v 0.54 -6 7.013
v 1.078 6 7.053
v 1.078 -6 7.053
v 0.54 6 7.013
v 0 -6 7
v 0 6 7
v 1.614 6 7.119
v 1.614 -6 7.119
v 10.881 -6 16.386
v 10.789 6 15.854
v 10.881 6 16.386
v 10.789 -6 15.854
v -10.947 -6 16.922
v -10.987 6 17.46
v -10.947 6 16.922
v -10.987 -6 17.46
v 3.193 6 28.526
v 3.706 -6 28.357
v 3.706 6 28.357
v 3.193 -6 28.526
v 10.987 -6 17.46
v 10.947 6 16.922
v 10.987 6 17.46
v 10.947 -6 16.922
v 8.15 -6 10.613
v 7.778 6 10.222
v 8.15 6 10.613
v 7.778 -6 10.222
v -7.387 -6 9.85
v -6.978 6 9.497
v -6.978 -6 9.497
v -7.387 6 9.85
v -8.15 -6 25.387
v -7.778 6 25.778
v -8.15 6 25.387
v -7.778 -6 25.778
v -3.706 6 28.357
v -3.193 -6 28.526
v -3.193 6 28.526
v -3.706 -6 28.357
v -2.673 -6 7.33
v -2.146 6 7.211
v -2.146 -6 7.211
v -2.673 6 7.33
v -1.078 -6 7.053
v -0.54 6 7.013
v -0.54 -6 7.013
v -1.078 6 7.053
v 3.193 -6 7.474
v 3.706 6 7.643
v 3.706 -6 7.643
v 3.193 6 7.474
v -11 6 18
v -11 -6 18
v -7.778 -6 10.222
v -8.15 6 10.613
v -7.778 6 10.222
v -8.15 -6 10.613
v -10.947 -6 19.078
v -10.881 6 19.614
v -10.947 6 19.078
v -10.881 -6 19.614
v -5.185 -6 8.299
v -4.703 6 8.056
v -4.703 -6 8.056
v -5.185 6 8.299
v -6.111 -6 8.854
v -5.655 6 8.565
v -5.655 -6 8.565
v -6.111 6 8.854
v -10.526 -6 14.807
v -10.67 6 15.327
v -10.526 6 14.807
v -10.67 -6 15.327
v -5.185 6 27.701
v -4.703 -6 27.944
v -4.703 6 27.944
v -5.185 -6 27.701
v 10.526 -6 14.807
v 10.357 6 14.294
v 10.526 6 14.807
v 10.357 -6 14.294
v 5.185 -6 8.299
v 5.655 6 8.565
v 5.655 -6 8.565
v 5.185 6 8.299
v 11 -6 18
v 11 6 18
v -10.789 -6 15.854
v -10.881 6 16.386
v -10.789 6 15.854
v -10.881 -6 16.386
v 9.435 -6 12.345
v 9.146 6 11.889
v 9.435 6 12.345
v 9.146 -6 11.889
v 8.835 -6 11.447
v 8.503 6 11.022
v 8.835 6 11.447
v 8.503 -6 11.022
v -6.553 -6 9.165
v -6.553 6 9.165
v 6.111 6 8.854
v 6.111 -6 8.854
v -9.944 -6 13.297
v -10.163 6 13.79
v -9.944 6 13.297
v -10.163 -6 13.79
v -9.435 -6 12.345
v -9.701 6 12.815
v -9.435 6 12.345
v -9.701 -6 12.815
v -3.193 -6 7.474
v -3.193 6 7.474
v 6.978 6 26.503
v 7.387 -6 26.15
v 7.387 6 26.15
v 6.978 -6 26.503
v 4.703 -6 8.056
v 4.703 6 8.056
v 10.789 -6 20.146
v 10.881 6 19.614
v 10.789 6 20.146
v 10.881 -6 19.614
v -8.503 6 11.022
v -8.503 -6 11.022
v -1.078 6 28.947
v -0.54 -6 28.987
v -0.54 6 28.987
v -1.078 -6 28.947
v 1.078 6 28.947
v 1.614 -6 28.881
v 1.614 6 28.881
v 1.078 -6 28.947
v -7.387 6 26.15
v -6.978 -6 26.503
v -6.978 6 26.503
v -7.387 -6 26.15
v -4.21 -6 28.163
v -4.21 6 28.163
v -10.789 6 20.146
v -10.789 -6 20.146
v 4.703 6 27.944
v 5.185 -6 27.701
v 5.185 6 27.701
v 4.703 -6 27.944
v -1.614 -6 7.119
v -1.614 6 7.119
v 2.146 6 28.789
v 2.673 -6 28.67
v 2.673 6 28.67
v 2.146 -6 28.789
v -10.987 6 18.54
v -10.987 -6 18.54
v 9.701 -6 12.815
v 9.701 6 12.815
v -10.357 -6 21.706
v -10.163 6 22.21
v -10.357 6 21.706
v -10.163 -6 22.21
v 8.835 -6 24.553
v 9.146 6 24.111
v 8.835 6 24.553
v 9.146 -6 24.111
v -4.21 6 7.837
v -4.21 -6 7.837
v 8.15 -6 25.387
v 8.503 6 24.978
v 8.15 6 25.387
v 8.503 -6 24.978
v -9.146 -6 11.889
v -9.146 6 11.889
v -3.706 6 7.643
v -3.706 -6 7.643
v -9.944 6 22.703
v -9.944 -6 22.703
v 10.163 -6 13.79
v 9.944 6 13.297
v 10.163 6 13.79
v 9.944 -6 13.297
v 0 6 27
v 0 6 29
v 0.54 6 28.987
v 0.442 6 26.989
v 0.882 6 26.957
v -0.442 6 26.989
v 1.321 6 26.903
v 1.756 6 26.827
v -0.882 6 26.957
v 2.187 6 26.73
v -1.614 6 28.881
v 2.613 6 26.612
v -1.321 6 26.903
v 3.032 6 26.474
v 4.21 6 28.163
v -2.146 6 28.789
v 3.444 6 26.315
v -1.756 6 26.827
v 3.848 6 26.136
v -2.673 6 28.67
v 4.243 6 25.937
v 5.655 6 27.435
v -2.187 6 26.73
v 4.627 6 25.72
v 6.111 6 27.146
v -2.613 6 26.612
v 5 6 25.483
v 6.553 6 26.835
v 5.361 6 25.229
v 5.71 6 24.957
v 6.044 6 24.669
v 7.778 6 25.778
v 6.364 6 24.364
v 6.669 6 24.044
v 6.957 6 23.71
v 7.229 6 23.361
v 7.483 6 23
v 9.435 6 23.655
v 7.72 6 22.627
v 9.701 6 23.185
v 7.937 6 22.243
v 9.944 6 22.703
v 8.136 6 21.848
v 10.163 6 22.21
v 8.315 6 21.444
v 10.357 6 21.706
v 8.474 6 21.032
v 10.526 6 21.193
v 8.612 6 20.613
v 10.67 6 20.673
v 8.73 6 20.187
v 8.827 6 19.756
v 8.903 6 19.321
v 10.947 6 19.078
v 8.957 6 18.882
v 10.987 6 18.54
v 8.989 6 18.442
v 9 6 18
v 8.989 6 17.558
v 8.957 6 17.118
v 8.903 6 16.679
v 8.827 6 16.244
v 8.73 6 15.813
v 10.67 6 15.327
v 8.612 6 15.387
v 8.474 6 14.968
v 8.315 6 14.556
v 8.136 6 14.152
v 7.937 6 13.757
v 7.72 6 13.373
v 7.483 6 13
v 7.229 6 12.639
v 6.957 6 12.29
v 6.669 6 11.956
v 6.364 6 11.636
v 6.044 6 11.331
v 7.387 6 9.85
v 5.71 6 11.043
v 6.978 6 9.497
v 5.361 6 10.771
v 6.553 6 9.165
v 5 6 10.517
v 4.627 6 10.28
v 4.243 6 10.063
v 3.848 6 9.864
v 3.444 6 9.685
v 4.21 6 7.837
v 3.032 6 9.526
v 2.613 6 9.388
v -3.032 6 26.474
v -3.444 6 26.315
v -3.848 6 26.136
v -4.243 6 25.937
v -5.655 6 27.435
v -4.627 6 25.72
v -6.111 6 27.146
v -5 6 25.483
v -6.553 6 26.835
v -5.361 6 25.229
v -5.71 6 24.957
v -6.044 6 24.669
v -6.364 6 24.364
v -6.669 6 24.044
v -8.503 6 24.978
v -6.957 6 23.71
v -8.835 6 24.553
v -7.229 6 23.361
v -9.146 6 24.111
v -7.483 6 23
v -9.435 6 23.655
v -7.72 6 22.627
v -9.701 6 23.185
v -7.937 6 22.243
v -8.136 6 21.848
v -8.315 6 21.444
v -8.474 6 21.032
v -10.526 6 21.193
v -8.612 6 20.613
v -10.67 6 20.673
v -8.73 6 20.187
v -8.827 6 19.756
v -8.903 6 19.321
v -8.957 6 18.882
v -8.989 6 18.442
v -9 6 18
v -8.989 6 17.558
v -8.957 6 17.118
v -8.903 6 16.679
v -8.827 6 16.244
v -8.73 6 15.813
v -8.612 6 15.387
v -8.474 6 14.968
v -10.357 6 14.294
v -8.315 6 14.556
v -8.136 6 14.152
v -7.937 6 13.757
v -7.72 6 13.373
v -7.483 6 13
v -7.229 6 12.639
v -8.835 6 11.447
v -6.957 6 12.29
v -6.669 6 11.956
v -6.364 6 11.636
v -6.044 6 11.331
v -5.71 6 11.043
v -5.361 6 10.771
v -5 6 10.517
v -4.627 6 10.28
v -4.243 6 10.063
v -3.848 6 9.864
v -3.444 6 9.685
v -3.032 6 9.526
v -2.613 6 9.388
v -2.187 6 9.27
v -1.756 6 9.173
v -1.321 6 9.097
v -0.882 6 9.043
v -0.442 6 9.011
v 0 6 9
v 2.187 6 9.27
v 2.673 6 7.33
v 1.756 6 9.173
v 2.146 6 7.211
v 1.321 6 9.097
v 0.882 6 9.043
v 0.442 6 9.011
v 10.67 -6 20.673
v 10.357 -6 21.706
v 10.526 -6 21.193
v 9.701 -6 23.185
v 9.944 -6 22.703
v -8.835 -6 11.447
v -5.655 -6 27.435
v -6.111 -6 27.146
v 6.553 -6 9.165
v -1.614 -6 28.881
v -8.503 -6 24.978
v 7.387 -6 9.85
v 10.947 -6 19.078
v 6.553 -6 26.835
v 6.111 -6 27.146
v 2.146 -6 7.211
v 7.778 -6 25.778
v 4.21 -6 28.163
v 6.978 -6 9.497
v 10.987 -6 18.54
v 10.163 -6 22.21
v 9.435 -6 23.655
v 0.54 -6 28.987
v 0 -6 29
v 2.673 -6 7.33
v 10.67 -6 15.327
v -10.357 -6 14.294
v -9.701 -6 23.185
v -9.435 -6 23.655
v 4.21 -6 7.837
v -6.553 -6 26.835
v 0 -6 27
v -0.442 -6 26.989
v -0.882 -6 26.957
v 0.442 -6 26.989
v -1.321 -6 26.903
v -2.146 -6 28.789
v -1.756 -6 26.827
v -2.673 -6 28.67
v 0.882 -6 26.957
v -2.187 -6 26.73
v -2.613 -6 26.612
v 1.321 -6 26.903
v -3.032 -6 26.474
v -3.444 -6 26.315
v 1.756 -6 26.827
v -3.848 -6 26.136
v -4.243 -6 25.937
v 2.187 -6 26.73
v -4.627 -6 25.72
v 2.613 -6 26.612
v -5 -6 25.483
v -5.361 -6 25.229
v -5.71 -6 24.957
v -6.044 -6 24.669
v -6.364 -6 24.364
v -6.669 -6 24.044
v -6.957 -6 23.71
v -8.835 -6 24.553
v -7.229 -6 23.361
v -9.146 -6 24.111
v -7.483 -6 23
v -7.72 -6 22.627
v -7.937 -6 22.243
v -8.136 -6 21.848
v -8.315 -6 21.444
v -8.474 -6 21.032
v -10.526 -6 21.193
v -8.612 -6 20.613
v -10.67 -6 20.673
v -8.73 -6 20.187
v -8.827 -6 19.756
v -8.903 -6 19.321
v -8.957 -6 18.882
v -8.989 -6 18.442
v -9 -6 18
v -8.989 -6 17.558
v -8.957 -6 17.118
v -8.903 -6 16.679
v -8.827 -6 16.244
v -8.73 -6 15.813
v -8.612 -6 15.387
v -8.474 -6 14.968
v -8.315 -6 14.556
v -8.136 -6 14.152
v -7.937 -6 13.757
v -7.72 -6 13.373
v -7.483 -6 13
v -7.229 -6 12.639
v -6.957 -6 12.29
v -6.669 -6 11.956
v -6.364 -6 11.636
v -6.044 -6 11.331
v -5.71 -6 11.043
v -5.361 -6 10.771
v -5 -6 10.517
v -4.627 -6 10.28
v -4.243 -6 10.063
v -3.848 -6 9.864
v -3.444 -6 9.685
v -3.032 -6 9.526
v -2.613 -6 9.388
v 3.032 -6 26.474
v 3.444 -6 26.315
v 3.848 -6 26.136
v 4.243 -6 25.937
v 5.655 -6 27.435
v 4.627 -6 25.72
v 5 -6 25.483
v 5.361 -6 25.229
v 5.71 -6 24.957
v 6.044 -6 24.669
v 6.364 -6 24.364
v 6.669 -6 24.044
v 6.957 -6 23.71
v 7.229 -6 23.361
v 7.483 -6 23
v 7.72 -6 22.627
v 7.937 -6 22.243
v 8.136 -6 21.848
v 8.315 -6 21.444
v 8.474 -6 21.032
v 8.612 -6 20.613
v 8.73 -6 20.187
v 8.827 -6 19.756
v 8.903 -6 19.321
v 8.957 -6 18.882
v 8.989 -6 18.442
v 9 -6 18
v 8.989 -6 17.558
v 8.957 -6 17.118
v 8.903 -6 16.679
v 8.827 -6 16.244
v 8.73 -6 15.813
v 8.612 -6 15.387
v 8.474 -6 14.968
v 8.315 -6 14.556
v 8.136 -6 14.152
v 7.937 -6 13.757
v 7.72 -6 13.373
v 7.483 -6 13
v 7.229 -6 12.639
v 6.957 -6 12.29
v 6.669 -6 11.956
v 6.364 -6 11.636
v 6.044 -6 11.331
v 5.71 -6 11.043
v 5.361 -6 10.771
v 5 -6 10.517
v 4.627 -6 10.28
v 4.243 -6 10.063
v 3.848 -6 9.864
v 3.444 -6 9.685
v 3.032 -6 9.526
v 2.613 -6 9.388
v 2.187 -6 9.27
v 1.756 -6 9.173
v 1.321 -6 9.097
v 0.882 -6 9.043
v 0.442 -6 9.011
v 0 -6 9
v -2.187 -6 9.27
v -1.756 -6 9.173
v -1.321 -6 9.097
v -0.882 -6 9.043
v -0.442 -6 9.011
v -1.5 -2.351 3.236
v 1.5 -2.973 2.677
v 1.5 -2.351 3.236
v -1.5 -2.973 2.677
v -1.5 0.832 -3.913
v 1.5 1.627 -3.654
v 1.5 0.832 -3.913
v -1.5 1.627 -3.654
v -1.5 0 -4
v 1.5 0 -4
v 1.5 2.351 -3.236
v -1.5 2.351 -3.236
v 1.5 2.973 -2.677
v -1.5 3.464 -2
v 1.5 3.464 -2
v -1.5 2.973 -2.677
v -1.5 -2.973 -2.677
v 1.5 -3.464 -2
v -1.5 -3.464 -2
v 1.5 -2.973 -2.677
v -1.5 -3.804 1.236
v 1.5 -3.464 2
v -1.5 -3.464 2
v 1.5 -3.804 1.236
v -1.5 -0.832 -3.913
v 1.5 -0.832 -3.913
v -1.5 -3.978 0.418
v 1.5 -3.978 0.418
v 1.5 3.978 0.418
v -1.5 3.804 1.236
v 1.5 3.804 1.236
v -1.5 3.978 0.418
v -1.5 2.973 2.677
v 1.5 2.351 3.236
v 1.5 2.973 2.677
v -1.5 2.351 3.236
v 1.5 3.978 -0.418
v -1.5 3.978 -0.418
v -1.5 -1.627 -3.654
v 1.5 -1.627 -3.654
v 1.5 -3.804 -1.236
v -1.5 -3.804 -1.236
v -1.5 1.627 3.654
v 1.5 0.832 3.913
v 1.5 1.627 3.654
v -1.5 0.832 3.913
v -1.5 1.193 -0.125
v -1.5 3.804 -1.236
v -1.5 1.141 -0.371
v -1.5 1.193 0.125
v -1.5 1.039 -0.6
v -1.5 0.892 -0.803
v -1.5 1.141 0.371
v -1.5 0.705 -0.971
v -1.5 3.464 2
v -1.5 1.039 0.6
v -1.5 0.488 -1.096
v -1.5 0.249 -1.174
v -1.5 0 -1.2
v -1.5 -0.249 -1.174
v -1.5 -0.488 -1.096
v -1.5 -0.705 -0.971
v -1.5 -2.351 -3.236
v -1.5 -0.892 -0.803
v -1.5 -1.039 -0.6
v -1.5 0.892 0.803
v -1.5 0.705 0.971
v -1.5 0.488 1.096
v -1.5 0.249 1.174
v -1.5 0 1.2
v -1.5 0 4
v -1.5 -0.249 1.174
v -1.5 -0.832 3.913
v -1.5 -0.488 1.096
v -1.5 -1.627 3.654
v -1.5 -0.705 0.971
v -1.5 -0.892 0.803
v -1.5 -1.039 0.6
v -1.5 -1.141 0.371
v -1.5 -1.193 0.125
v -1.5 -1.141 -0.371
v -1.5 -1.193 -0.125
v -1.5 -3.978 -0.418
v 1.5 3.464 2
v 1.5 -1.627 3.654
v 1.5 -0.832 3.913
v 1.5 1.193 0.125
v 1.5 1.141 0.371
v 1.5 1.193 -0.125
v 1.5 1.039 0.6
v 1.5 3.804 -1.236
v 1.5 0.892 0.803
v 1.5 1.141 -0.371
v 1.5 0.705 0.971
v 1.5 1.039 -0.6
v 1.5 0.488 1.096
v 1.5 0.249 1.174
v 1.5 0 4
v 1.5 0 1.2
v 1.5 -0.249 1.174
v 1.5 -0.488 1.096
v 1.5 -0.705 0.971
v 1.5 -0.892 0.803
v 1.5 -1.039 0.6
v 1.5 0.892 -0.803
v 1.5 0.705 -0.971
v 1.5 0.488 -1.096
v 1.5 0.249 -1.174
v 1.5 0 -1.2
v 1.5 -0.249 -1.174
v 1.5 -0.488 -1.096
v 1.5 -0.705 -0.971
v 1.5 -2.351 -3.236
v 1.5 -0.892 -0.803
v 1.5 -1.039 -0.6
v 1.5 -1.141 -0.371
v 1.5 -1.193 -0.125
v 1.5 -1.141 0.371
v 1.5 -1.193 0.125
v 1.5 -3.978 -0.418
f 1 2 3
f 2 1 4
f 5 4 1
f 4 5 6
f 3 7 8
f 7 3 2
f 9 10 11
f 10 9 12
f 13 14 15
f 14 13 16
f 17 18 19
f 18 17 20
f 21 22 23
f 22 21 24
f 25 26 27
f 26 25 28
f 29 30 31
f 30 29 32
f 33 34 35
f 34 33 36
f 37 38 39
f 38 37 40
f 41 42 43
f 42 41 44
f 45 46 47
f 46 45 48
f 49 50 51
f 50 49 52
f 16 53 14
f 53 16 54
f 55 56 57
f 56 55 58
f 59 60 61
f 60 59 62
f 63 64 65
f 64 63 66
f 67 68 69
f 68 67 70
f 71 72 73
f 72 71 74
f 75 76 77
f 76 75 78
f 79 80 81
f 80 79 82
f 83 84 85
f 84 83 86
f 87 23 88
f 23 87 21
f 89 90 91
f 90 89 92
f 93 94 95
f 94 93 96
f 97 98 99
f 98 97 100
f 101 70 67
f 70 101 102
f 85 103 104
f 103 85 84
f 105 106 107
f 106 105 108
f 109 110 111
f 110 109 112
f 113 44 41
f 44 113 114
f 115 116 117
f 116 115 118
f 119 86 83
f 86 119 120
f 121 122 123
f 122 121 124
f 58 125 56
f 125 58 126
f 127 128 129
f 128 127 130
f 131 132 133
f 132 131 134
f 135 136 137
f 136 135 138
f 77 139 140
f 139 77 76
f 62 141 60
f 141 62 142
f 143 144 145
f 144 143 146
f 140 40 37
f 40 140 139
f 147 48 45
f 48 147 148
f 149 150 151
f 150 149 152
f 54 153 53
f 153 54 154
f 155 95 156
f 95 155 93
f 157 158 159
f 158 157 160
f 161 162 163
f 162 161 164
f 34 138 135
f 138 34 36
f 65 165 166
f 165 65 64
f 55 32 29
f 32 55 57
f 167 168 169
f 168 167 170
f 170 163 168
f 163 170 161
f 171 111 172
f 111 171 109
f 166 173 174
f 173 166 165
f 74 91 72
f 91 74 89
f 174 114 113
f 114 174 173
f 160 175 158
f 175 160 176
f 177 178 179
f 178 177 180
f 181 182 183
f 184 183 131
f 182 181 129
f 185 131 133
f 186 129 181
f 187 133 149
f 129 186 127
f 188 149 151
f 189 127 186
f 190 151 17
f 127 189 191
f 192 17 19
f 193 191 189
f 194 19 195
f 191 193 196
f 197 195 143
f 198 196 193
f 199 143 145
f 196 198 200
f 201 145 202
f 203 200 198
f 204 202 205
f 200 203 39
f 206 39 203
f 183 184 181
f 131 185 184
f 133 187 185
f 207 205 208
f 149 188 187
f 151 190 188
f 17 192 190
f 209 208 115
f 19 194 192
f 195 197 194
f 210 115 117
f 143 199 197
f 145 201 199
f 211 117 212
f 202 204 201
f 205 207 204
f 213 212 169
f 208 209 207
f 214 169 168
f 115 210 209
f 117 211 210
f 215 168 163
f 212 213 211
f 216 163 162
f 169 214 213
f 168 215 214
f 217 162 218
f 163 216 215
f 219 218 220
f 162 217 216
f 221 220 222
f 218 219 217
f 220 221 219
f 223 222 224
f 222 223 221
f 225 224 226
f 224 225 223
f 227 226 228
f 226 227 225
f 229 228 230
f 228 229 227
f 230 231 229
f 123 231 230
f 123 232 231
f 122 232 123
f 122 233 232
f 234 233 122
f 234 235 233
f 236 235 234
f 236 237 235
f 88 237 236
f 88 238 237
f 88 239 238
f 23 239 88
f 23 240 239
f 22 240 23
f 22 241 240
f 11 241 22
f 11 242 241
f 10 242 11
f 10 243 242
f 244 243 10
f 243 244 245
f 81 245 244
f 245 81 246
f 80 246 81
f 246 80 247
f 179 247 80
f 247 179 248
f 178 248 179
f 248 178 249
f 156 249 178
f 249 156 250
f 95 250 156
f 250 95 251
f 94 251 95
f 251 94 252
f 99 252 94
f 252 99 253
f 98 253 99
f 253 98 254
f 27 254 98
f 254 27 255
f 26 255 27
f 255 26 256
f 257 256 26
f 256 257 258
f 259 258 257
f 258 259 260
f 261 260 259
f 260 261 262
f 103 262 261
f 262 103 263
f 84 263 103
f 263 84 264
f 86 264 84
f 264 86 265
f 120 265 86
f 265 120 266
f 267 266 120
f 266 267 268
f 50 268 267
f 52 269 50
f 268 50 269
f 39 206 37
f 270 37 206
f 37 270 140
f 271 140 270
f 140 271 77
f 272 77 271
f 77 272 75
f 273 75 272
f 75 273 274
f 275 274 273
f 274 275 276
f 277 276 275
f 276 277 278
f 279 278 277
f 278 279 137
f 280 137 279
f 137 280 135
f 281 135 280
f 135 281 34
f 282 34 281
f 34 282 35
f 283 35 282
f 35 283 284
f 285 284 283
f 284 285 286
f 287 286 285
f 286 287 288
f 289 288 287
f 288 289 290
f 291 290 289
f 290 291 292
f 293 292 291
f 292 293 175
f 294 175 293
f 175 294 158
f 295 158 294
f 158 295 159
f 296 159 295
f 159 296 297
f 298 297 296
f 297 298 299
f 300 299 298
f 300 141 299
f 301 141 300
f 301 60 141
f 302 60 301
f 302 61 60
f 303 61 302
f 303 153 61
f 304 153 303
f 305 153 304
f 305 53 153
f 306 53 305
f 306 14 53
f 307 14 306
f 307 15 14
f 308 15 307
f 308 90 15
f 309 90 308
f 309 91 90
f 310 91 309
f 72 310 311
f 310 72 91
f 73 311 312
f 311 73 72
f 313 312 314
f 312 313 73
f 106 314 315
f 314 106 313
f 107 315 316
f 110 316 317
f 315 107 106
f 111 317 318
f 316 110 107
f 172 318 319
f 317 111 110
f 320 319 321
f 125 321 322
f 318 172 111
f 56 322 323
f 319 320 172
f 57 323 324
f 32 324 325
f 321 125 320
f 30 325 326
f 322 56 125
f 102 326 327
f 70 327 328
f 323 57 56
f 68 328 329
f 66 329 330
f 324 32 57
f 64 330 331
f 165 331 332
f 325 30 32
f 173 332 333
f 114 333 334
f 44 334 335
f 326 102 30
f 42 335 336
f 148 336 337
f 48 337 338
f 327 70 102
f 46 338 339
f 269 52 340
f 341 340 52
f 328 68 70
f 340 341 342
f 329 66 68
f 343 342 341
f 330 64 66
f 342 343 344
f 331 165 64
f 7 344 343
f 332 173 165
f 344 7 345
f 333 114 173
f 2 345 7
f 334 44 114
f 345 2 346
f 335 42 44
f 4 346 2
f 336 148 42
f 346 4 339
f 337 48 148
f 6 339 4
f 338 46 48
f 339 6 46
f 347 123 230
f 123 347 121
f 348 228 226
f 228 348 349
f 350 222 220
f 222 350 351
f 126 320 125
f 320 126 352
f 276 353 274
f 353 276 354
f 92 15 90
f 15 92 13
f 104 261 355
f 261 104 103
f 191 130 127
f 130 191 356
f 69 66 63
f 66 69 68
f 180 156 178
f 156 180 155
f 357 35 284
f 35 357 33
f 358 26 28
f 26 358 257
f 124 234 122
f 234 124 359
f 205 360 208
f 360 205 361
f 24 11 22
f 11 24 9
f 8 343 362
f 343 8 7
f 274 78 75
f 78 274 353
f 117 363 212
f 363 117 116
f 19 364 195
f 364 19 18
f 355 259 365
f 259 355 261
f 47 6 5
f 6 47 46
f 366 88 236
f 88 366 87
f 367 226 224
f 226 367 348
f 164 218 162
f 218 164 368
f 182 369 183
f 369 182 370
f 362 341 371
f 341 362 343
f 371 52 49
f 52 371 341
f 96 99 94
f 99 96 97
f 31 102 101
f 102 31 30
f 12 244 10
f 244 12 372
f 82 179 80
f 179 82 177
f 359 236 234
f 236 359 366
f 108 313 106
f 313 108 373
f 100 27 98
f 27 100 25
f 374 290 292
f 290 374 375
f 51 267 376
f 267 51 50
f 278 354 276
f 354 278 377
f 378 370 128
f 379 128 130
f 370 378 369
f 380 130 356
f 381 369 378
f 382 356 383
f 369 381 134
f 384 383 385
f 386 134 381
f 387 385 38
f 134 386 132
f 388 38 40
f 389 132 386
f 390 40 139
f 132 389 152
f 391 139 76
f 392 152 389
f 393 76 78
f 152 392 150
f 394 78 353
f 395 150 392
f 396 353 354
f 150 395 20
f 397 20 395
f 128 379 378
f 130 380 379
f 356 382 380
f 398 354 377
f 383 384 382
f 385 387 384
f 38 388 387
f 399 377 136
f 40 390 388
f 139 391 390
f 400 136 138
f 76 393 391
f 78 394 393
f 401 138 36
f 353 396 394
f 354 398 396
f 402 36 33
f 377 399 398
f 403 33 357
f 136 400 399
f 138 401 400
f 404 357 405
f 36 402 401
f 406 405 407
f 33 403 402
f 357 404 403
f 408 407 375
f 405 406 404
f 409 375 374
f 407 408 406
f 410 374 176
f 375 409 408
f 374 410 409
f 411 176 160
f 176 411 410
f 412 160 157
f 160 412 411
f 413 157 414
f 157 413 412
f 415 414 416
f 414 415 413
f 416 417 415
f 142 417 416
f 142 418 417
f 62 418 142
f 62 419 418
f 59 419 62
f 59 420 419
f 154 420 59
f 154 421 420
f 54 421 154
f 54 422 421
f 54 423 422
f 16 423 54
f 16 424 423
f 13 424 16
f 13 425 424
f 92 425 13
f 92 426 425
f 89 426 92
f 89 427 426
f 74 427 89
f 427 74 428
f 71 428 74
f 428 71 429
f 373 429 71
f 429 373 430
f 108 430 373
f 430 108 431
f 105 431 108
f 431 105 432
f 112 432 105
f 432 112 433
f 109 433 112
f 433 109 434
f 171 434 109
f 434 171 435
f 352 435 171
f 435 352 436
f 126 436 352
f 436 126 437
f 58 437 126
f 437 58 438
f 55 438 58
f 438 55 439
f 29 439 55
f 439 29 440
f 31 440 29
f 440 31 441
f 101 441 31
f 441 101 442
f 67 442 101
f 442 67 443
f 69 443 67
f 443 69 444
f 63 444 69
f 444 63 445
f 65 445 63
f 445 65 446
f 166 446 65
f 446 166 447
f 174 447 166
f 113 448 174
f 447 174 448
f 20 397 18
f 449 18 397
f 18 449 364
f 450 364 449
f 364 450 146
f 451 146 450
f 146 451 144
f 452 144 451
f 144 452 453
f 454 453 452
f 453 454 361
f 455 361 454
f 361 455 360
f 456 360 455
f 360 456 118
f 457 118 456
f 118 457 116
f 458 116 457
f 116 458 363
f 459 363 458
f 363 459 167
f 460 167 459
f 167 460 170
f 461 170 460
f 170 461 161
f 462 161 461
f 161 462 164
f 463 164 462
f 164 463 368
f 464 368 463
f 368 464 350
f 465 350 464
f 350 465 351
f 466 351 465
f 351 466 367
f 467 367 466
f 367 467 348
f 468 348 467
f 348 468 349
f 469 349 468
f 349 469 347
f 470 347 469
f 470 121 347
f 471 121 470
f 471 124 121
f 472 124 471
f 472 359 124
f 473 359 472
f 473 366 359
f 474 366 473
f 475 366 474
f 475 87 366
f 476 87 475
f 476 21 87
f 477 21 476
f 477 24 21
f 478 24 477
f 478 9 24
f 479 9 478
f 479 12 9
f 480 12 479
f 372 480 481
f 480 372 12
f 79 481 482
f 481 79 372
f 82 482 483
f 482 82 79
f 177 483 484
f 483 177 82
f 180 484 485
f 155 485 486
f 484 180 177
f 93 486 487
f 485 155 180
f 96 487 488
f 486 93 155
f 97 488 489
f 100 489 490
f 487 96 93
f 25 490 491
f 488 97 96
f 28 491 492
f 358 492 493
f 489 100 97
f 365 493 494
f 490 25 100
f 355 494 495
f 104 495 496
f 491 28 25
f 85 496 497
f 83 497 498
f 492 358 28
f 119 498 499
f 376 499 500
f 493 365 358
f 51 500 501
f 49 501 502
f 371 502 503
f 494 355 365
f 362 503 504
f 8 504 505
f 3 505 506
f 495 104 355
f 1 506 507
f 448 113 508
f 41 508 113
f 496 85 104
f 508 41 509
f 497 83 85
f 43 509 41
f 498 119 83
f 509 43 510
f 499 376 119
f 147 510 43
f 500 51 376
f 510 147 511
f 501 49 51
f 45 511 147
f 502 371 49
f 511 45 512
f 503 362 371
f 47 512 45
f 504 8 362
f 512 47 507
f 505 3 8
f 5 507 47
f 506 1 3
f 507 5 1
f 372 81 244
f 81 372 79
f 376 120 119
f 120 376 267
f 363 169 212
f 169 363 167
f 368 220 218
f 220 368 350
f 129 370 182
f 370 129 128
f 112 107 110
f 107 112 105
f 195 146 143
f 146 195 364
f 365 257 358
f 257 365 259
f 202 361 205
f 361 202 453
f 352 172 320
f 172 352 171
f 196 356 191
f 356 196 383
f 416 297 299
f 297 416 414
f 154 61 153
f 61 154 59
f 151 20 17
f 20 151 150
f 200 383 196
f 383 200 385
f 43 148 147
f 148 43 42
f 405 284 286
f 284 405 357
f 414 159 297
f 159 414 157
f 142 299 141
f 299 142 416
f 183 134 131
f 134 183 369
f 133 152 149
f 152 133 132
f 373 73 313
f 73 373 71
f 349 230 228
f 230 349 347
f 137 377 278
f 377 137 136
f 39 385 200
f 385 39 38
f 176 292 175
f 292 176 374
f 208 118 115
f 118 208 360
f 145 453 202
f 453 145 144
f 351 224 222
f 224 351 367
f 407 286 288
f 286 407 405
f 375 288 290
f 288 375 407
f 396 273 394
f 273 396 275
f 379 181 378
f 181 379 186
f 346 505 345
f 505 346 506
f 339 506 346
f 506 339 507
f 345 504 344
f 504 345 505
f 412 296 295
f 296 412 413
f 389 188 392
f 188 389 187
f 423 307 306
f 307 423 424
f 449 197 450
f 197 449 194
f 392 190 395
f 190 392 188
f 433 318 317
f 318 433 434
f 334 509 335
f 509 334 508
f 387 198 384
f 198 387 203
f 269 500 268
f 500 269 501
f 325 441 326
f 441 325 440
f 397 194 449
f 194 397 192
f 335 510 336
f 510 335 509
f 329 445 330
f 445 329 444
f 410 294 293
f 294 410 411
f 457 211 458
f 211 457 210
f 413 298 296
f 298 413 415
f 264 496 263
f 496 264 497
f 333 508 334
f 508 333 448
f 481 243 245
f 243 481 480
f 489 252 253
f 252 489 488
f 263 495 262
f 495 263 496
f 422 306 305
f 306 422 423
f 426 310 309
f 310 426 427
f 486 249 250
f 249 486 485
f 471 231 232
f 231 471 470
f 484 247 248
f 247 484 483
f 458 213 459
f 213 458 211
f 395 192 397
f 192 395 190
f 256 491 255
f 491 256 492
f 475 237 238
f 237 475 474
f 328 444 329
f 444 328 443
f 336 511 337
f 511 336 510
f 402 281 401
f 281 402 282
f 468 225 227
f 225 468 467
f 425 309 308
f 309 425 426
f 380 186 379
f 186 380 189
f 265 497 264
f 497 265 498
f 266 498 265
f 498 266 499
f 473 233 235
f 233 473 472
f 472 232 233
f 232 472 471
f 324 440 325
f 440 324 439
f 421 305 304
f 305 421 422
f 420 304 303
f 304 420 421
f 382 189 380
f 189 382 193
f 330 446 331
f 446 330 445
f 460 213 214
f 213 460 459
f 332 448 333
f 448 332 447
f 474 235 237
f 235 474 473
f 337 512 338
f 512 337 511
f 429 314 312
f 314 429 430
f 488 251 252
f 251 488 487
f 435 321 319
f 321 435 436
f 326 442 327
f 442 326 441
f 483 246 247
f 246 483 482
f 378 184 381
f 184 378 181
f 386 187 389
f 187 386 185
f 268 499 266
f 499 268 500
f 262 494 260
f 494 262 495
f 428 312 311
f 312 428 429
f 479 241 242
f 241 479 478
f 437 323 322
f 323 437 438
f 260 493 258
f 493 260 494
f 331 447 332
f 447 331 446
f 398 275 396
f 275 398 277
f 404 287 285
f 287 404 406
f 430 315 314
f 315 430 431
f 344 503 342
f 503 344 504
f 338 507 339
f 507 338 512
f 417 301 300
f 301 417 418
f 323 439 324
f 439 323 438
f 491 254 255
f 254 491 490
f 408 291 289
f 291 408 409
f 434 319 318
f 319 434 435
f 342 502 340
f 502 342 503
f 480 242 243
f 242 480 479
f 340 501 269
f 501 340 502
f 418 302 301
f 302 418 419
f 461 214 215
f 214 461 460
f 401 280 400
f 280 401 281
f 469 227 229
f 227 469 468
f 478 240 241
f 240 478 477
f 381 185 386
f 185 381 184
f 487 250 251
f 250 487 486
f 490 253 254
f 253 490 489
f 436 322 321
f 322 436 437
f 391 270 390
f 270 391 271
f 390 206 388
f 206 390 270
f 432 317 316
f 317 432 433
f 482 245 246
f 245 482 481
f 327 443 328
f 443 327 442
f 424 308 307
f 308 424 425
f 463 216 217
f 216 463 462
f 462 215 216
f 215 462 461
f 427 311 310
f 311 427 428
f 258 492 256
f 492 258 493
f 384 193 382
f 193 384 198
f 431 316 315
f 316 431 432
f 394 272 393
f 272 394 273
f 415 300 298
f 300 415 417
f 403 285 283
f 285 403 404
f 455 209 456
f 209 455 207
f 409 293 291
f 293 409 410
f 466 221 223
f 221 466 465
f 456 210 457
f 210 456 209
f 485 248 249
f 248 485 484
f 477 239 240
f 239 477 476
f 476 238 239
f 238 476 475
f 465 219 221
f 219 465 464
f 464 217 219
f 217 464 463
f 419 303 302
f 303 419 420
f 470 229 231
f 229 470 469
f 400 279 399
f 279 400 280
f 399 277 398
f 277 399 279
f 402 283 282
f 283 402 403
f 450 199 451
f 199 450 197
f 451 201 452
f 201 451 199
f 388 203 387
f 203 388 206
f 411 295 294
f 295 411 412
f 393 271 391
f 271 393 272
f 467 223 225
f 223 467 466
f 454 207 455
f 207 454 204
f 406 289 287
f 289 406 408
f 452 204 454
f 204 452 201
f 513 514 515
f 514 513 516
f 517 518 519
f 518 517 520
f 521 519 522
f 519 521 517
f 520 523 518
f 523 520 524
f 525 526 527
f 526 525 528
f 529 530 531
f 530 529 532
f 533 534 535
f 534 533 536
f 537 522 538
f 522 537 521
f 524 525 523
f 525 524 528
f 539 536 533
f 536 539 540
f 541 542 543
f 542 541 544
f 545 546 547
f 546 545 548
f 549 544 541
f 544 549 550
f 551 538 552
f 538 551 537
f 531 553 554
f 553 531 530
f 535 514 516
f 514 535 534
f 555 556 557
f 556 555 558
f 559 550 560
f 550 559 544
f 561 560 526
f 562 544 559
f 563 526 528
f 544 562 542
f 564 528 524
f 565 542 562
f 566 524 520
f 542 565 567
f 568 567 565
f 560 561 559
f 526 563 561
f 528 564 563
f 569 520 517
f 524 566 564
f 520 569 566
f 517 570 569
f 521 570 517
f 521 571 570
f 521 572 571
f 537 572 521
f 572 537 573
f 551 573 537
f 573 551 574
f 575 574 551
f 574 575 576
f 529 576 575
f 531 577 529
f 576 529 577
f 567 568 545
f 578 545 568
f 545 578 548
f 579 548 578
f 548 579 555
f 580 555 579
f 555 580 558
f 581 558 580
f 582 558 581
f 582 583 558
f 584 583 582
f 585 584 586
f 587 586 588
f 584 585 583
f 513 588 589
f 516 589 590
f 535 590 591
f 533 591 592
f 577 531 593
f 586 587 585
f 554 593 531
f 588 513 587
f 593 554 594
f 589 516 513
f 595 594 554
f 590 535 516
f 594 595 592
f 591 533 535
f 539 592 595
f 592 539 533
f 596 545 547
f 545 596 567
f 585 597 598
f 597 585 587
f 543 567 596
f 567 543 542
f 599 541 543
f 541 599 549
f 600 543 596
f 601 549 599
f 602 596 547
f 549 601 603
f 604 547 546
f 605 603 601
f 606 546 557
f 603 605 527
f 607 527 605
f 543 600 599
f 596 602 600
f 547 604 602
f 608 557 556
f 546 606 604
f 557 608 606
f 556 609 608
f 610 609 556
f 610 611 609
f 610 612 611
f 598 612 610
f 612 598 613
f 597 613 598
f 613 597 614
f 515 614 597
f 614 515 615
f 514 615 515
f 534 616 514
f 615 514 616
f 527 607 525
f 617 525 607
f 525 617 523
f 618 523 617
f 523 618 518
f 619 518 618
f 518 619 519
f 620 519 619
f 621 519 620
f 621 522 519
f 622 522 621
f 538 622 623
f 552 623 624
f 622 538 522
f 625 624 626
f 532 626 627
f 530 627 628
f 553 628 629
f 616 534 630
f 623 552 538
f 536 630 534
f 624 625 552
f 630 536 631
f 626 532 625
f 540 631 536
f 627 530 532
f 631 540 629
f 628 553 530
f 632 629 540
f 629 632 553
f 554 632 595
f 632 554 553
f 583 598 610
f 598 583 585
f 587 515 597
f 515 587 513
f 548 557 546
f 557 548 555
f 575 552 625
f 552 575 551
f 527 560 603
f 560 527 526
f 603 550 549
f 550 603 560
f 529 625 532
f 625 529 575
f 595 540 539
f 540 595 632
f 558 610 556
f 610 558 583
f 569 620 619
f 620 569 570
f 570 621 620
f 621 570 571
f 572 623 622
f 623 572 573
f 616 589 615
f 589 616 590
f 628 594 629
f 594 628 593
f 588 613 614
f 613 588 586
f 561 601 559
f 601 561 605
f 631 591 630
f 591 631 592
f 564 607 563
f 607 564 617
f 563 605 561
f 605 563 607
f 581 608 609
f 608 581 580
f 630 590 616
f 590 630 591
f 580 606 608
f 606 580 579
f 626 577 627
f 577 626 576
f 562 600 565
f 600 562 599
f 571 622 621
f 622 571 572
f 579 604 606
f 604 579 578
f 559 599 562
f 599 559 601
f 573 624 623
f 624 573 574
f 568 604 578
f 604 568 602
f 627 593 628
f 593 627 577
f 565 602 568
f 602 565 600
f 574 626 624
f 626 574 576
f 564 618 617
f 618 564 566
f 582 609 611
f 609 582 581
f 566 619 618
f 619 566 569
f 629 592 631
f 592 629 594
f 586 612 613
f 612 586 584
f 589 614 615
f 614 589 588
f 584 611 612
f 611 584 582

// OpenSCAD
// file: use/openscad/hollowCylinder.scad
/*
	hollowCylinder() v1.0.0 by robert@cosmicrealms.com from https://github.com/Sembiance/openscad-modules
	Allows you to create a hollow cylinder
	
	Usage
	=====
	Prototype: hollowCylinder(d, h, wallWidth, $fn)
	Arguments:
		-         d = Diamater of the cylinder. Default: 5
		-         h = Height of the cylinder. Default: 10
		- wallWidth = How wide the walls should be. Default: 1
		-       $fn = How smooth you want the cylinder rounding to be. Default: 128

	Change Log
	==========
	2017-01-04: v1.0.0 - Initial Release
*/

// Example code:
/*
hollowCylinder(d=10, h=20);
translate([15, 0, 0]) { hollowCylinder(d=15, h=5, wallWidth=0.1); }
translate([30, 0, 0]) { hollowCylinder(d=10, h=2, wallWidth=4.5); }
*/

module hollowCylinder(d=5, h=10, wallWidth=1, $fn=128)
{
	difference()
	{
		cylinder(d=d, h=h, center=true);
		translate([0, 0, -0.1]) { cylinder(d=d-(wallWidth*2), h=h+0.2, center=true); }
	}
}
// main file
use <use/openscad/hollowCylinder.scad>
$fn=30;
tensioner();

module tensioner(){
    translate([0,0,18])
    rotate([90,90,0])
    hollowCylinder(d=22, wallWidth=2, h=12);
    
    rotate([90,90,90]){
        difference(){
            cylinder(d=8, h=3, center=true);
            cylinder(d=2.4, h = 4, center=true);
        }
    }
}
